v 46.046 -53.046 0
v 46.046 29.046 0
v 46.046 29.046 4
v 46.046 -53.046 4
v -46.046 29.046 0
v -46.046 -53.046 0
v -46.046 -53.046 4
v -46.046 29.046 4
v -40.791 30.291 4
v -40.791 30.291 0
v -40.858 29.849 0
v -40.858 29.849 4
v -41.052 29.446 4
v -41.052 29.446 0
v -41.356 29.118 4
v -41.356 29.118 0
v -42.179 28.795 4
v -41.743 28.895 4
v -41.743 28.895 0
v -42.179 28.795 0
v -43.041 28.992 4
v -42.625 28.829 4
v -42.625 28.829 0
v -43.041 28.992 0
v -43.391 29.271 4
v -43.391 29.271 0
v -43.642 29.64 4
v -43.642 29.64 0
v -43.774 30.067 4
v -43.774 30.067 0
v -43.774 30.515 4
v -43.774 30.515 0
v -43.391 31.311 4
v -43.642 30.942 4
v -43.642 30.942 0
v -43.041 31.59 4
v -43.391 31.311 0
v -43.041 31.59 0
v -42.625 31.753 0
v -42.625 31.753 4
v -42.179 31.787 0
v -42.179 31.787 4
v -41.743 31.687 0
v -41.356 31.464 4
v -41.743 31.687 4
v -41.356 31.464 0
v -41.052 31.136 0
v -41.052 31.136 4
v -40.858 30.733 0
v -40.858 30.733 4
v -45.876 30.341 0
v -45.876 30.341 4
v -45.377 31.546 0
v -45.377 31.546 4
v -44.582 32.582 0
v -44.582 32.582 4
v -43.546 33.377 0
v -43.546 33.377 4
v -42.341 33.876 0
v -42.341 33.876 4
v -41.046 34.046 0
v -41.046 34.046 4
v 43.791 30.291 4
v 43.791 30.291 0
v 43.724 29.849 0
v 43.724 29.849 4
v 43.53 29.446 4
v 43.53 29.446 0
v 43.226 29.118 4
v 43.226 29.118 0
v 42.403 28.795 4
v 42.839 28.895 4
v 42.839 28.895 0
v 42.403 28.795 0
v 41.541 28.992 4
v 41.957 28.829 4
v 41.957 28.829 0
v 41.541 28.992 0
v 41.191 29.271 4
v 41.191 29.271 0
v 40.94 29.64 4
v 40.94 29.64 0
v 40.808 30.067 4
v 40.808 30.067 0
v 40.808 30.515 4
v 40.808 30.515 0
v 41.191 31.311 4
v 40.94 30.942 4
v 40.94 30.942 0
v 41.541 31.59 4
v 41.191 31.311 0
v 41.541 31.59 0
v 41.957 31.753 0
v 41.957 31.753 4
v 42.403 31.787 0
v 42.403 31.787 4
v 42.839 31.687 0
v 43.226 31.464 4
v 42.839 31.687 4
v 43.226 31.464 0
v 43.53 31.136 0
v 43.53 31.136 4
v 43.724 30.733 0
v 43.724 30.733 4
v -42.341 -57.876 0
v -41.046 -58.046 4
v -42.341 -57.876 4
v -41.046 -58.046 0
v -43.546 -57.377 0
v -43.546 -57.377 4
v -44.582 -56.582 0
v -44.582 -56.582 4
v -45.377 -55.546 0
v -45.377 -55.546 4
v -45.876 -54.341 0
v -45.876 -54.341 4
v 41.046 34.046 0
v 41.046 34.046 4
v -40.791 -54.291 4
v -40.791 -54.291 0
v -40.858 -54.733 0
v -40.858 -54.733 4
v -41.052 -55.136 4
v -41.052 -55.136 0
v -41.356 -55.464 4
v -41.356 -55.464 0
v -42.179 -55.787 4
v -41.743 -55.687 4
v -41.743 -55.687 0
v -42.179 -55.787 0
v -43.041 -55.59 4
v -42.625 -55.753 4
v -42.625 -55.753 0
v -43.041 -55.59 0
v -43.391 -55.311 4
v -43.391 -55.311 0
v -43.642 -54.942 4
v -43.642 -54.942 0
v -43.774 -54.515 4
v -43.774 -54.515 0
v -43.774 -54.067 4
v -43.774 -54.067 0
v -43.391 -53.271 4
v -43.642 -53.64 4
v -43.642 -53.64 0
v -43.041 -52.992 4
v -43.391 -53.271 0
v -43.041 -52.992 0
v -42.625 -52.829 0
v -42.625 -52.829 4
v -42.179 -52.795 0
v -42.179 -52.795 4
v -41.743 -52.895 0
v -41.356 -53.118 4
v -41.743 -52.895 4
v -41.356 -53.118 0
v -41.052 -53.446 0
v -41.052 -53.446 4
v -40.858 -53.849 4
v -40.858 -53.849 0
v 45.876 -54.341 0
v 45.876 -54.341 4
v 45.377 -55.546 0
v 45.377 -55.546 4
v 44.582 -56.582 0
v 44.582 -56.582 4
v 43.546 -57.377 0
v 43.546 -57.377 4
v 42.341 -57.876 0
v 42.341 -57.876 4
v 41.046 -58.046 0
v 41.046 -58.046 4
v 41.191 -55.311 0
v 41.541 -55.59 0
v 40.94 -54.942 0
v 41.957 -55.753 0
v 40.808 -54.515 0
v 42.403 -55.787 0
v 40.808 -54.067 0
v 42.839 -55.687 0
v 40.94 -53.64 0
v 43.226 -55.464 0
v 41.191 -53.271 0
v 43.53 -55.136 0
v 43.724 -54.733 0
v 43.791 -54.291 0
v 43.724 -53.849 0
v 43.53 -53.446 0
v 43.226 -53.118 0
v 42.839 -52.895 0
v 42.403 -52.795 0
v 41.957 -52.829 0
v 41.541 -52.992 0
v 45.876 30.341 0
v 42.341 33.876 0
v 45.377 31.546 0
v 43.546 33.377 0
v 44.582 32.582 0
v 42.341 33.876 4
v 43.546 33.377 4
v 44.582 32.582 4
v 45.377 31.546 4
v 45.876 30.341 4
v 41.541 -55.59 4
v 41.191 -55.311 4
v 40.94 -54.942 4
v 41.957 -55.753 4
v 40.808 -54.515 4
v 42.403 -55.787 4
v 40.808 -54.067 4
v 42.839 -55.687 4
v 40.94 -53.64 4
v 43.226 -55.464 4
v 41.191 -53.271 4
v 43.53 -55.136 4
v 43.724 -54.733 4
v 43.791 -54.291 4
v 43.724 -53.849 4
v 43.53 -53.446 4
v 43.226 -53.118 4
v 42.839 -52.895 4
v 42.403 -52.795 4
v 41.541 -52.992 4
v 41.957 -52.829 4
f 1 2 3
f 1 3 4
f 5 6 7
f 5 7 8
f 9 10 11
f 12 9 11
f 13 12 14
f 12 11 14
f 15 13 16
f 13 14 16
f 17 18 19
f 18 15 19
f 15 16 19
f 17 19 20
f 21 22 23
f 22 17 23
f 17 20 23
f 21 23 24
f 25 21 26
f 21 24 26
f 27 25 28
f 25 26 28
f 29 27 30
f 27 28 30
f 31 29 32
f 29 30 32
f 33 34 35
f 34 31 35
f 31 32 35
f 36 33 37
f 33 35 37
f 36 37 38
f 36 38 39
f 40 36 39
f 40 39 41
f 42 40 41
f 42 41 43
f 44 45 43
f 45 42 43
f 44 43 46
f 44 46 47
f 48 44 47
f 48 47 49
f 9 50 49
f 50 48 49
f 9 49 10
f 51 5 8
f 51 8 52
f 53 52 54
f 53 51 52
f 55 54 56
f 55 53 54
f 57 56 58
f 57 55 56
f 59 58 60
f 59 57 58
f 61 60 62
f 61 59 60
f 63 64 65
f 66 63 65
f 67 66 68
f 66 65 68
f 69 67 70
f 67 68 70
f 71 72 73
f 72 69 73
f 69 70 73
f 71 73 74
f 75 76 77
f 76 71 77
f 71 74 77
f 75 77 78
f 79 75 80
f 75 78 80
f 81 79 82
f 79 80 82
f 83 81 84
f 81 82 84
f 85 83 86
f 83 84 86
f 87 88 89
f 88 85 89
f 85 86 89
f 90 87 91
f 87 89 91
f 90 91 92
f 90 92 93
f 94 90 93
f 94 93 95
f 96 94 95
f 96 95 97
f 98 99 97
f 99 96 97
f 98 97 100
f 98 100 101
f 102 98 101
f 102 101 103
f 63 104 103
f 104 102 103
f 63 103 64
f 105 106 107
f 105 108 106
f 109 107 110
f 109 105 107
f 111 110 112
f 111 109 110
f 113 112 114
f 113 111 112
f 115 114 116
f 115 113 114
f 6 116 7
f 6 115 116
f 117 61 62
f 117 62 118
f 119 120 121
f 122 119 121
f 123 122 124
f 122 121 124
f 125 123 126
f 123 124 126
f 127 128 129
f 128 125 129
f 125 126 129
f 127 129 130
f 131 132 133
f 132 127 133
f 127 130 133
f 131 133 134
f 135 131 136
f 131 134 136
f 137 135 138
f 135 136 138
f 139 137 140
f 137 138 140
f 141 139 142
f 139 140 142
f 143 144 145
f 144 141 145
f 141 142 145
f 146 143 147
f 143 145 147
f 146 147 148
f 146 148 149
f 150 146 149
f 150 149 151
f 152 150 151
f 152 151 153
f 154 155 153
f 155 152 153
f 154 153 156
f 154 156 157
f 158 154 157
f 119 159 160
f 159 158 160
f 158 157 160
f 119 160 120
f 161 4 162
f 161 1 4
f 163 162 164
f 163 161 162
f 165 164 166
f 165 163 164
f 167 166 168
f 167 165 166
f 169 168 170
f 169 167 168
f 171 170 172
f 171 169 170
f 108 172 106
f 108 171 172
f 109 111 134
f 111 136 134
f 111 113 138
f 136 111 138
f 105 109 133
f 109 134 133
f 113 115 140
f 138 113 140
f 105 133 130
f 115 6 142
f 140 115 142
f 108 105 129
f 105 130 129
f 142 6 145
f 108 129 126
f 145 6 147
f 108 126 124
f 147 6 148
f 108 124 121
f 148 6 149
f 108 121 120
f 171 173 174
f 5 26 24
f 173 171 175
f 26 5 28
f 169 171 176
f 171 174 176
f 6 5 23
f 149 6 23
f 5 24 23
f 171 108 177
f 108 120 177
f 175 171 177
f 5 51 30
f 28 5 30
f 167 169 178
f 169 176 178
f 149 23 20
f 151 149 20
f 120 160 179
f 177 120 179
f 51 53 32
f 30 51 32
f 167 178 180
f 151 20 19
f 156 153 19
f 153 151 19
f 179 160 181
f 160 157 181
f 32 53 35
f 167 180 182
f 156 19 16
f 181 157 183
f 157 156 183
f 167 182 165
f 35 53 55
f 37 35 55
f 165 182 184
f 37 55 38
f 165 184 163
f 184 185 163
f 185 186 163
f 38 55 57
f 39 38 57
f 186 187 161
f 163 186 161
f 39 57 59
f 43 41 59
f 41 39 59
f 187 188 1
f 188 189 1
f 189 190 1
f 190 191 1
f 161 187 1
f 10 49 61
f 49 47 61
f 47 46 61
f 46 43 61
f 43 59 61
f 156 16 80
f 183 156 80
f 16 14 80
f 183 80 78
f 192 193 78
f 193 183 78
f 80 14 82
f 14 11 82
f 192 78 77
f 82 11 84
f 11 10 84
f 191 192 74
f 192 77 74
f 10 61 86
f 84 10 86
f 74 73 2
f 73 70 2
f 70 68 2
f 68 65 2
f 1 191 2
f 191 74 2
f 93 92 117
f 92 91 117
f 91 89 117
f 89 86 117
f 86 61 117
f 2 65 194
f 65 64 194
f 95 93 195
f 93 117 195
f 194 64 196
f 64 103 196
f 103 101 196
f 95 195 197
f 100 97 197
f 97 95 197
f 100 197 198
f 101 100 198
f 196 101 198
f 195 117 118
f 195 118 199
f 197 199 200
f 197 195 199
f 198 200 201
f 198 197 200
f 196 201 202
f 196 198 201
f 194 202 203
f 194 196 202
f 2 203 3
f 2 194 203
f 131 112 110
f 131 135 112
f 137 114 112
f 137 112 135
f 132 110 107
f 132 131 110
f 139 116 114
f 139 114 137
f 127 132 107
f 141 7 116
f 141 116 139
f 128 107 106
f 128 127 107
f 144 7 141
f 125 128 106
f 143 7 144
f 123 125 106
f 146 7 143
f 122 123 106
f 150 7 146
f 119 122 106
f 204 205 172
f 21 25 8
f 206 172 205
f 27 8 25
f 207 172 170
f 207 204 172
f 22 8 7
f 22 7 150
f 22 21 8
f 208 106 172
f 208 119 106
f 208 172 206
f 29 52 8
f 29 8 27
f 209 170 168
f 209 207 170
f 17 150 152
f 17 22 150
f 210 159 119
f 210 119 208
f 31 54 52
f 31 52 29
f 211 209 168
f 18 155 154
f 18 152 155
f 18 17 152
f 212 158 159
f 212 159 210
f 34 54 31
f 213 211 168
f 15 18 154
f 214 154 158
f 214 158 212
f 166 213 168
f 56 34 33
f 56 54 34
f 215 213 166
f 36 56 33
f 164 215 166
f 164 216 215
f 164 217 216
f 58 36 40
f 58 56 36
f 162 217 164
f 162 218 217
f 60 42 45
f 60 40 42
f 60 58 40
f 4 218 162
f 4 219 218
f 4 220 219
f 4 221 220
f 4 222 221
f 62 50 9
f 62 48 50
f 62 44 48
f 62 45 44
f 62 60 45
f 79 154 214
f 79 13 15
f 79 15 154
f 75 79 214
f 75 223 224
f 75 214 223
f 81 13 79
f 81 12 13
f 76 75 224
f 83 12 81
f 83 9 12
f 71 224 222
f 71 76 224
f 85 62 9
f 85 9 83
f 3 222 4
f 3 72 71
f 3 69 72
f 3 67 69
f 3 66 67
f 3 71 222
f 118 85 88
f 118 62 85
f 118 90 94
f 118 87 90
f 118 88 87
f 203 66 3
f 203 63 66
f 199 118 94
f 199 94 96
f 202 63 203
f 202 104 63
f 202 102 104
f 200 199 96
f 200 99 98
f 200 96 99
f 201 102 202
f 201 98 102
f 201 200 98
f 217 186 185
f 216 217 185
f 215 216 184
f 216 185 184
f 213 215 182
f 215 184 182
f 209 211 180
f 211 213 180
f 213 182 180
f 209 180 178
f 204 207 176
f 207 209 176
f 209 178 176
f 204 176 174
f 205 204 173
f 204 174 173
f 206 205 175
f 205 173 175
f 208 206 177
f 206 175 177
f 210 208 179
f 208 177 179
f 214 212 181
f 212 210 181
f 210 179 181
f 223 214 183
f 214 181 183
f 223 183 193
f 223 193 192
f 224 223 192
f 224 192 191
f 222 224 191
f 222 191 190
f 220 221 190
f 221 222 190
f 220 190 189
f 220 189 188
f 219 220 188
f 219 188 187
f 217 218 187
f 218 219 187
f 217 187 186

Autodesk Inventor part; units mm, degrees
ref_plane "YZ Plane" through (0, 0, 0) normal (1, 0, 0) x (0, 1, 0)
ref_plane "XZ Plane" through (0, 0, 0) normal (0, 1, 0) x (-1, 0, 0)
ref_plane "XY Plane" through (0, 0, 0) normal (0, 0, 1) x (1, 0, 0)
sketch "Sketch1" plane through (0, 0, 0) normal (0, 0, 1) x (1, 0, 0)
  line L0 (-40, 28) -> (40, 28) construction
  line L1 (-40, -52) -> (-40, 28) construction
  line L2 (-40, 53) -> (-40, 133) construction
  line L3 (-40, 133) -> (40, 133) construction
  line L4 (40, 133) -> (40, 53) construction
  line L5 (40, 53) -> (-40, 53) construction
  line L6 (-40, -52) -> (-40, 28) construction
  line L7 (-40, 28) -> (40, 28) construction
  line L8 (40, 28) -> (40, -52) construction
  line L9 (40, -52) -> (-40, -52) construction
  circle A0 centre (-27.5, 195) radius 1.5 construction
  circle A1 centre (27.5, 195) radius 1.5 construction
  circle A2 centre (27.5, -116) radius 1.5 construction
  circle A3 centre (-27.5, -116) radius 1.5 construction
  circle A4 centre (-27.5, -183) radius 1.5 construction
  circle A5 centre (27.5, -183) radius 1.5 construction
  line L10 (-37.5, -118) -> (-72.5, -118) construction
  line L11 (-72.5, -118) -> (-72.5, -114) construction
  line L12 (-72.5, -114) -> (-37.5, -114) construction
  line L13 (-37.5, -114) -> (-37.5, -118) construction
  line L14 (72.5, 197) -> (72.5, 193) construction
  line L15 (72.5, 193) -> (37.5, 193) construction
  line L16 (37.5, 193) -> (37.5, 197) construction
  line L17 (37.5, 197) -> (72.5, 197) construction
  line L18 (-17.5, 197) -> (17.5, 197) construction
  line L19 (17.5, 197) -> (17.5, 193) construction
  line L20 (17.5, 193) -> (-17.5, 193) construction
  line L21 (-17.5, 193) -> (-17.5, 197) construction
  line L22 (-37.5, -185) -> (-72.5, -185) construction
  line L23 (-72.5, -185) -> (-72.5, -181) construction
  line L24 (-72.5, -181) -> (-37.5, -181) construction
  line L25 (-37.5, -181) -> (-37.5, -185) construction
  line L26 (17.5, -118) -> (-17.5, -118) construction
  line L27 (-17.5, -118) -> (-17.5, -114) construction
  line L28 (-17.5, -114) -> (17.5, -114) construction
  line L29 (17.5, -114) -> (17.5, -118) construction
  line L30 (72.5, -185) -> (37.5, -185) construction
  line L31 (37.5, -185) -> (37.5, -181) construction
  line L32 (37.5, -181) -> (72.5, -181) construction
  line L33 (72.5, -181) -> (72.5, -185) construction
  line L34 (-37.5, 193) -> (-72.5, 193) construction
  line L35 (-72.5, 193) -> (-72.5, 197) construction
  line L36 (-72.5, 197) -> (-37.5, 197) construction
  line L37 (-37.5, 197) -> (-37.5, 193) construction
  line L38 (17.5, -181) -> (17.5, -185) construction
  line L39 (17.5, -185) -> (-17.5, -185) construction
  line L40 (-17.5, -185) -> (-17.5, -181) construction
  line L41 (-17.5, -181) -> (17.5, -181) construction
  line L42 (72.5, -114) -> (72.5, -118) construction
  line L43 (72.5, -118) -> (37.5, -118) construction
  line L44 (37.5, -118) -> (37.5, -114) construction
  line L45 (37.5, -114) -> (72.5, -114) construction
  circle A6 centre (-102, 39.5) radius 1.5 construction
  circle A7 centre (-102, -110.5) radius 1.5 construction
  circle A8 centre (102, -35.5) radius 1.5 construction
  circle A9 centre (102, 114.5) radius 1.5 construction
  circle A10 centre (102, -185.5) radius 1.5 construction
  circle A11 centre (-102, 189.5) radius 1.5 construction
  line L46 (100, 188) -> (95.2, 188) construction
  line L47 (95.2, 188) -> (95.2, 186.8) construction
  line L48 (95.2, 186.8) -> (92.8, 186.8) construction
  line L49 (92.8, 186.8) -> (92.8, 188) construction
  line L50 (92.8, 188) -> (88, 188) construction
  line L51 (88, 188) -> (88, 191) construction
  line L52 (88, 191) -> (92.8, 191) construction
  line L53 (92.8, 191) -> (92.8, 192.2) construction
  line L54 (92.8, 192.2) -> (95.2, 192.2) construction
  line L55 (95.2, 192.2) -> (95.2, 191) construction
  line L56 (95.2, 191) -> (100, 191) construction
  line L57 (100, 227) -> (100, 191) construction
  line L58 (87.5, 227) -> (100, 227) construction
  line L59 (87.5, 231) -> (87.5, 227) construction
  line L60 (52.5, 231) -> (87.5, 231) construction
  line L61 (52.5, 227) -> (52.5, 231) construction
  line L62 (36.5, 227) -> (52.5, 227) construction
  line L63 (36.5, 222.2) -> (36.5, 227) construction
  line L64 (37.7, 222.2) -> (36.5, 222.2) construction
  line L65 (37.7, 219.8) -> (37.7, 222.2) construction
  line L66 (36.5, 219.8) -> (37.7, 219.8) construction
  line L67 (36.5, 215) -> (36.5, 219.8) construction
  line L68 (33.5, 215) -> (36.5, 215) construction
  line L69 (33.5, 219.8) -> (33.5, 215) construction
  line L70 (32.3, 219.8) -> (33.5, 219.8) construction
  line L71 (32.3, 222.2) -> (32.3, 219.8) construction
  line L72 (33.5, 222.2) -> (32.3, 222.2) construction
  line L73 (33.5, 227) -> (33.5, 222.2) construction
  line L74 (17.5, 227) -> (33.5, 227) construction
  line L75 (17.5, 231) -> (17.5, 227) construction
  line L76 (-17.5, 231) -> (17.5, 231) construction
  line L77 (-17.5, 227) -> (-17.5, 231) construction
  line L78 (-33.5, 227) -> (-17.5, 227) construction
  line L79 (-33.5, 222.2) -> (-33.5, 227) construction
  line L80 (-32.3, 222.2) -> (-33.5, 222.2) construction
  line L81 (-32.3, 219.8) -> (-32.3, 222.2) construction
  line L82 (-33.5, 219.8) -> (-32.3, 219.8) construction
  line L83 (-33.5, 215) -> (-33.5, 219.8) construction
  line L84 (-36.5, 215) -> (-33.5, 215) construction
  line L85 (-36.5, 219.8) -> (-36.5, 215) construction
  line L86 (-37.7, 219.8) -> (-36.5, 219.8) construction
  line L87 (-37.7, 222.2) -> (-37.7, 219.8) construction
  line L88 (-36.5, 222.2) -> (-37.7, 222.2) construction
  line L89 (-36.5, 227) -> (-36.5, 222.2) construction
  line L90 (-52.5, 227) -> (-36.5, 227) construction
  line L91 (-52.5, 231) -> (-52.5, 227) construction
  line L92 (-87.5, 231) -> (-52.5, 231) construction
  line L93 (-87.5, 227) -> (-87.5, 231) construction
  line L94 (-104, 227) -> (-87.5, 227) construction
  line L95 (-104, 152) -> (-104, 227) construction
  line L96 (-100, 152) -> (-104, 152) construction
  line L97 (-100, 116) -> (-100, 152) construction
  line L98 (-100, 116) -> (-95.2, 116) construction
  line L99 (-95.2, 116) -> (-95.2, 117.2) construction
  line L100 (-95.2, 117.2) -> (-92.8, 117.2) construction
  line L101 (-92.8, 117.2) -> (-92.8, 116) construction
  line L102 (-92.8, 116) -> (-88, 116) construction
  line L103 (-88, 116) -> (-88, 113) construction
  line L104 (-88, 113) -> (-92.8, 113) construction
  line L105 (-92.8, 113) -> (-92.8, 111.8) construction
  line L106 (-92.8, 111.8) -> (-95.2, 111.8) construction
  line L107 (-95.2, 111.8) -> (-95.2, 113) construction
  line L108 (-95.2, 113) -> (-100, 113) construction
  line L109 (-100, 77) -> (-100, 113) construction
  line L110 (-104, 77) -> (-100, 77) construction
  line L111 (-104, 2) -> (-104, 77) construction
  line L112 (-100, 2) -> (-104, 2) construction
  line L113 (-100, -34) -> (-100, 2) construction
  line L114 (-100, -34) -> (-95.2, -34) construction
  line L115 (-95.2, -34) -> (-95.2, -32.8) construction
  line L116 (-95.2, -32.8) -> (-92.8, -32.8) construction
  line L117 (-92.8, -32.8) -> (-92.8, -34) construction
  line L118 (-92.8, -34) -> (-88, -34) construction
  line L119 (-88, -34) -> (-88, -37) construction
  line L120 (-88, -37) -> (-92.8, -37) construction
  line L121 (-92.8, -37) -> (-92.8, -38.2) construction
  line L122 (-92.8, -38.2) -> (-95.2, -38.2) construction
  line L123 (-95.2, -38.2) -> (-95.2, -37) construction
  line L124 (-95.2, -37) -> (-100, -37) construction
  line L125 (-100, -73) -> (-100, -37) construction
  line L126 (-104, -73) -> (-100, -73) construction
  line L127 (-104, -148) -> (-104, -73) construction
  line L128 (-100, -148) -> (-104, -148) construction
  line L129 (-100, -184) -> (-100, -148) construction
  line L130 (-100, -184) -> (-95.2, -184) construction
  line L131 (-95.2, -184) -> (-95.2, -182.8) construction
  line L132 (-95.2, -182.8) -> (-92.8, -182.8) construction
  line L133 (-92.8, -182.8) -> (-92.8, -184) construction
  line L134 (-92.8, -184) -> (-88, -184) construction
  line L135 (-88, -184) -> (-88, -187) construction
  line L136 (-88, -187) -> (-92.8, -187) construction
  line L137 (-92.8, -187) -> (-92.8, -188.2) construction
  line L138 (-92.8, -188.2) -> (-95.2, -188.2) construction
  line L139 (-95.2, -188.2) -> (-95.2, -187) construction
  line L140 (-95.2, -187) -> (-100, -187) construction
  line L141 (-100, -223) -> (-100, -187) construction
  line L142 (-87.5, -223) -> (-100, -223) construction
  line L143 (-87.5, -231) -> (-87.5, -223) construction
  line L144 (-52.5, -231) -> (-87.5, -231) construction
  line L145 (-52.5, -223) -> (-52.5, -231) construction
  line L146 (-36.5, -223) -> (-52.5, -223) construction
  line L147 (-36.5, -218.2) -> (-36.5, -223) construction
  line L148 (-37.7, -218.2) -> (-36.5, -218.2) construction
  line L149 (-37.7, -215.8) -> (-37.7, -218.2) construction
  line L150 (-36.5, -215.8) -> (-37.7, -215.8) construction
  line L151 (-36.5, -211) -> (-36.5, -215.8) construction
  line L152 (-33.5, -211) -> (-36.5, -211) construction
  line L153 (-33.5, -215.8) -> (-33.5, -211) construction
  line L154 (-32.3, -215.8) -> (-33.5, -215.8) construction
  line L155 (-32.3, -218.2) -> (-32.3, -215.8) construction
  line L156 (-33.5, -218.2) -> (-32.3, -218.2) construction
  line L157 (-33.5, -223) -> (-33.5, -218.2) construction
  line L158 (-17.5, -223) -> (-33.5, -223) construction
  line L159 (-17.5, -231) -> (-17.5, -223) construction
  line L160 (17.5, -231) -> (-17.5, -231) construction
  line L161 (17.5, -223) -> (17.5, -231) construction
  line L162 (33.5, -223) -> (17.5, -223) construction
  line L163 (33.5, -218.2) -> (33.5, -223) construction
  line L164 (32.3, -218.2) -> (33.5, -218.2) construction
  line L165 (32.3, -215.8) -> (32.3, -218.2) construction
  line L166 (33.5, -215.8) -> (32.3, -215.8) construction
  line L167 (33.5, -211) -> (33.5, -215.8) construction
  line L168 (36.5, -211) -> (33.5, -211) construction
  line L169 (36.5, -215.8) -> (36.5, -211) construction
  line L170 (37.7, -215.8) -> (36.5, -215.8) construction
  line L171 (37.7, -218.2) -> (37.7, -215.8) construction
  line L172 (36.5, -218.2) -> (37.7, -218.2) construction
  line L173 (36.5, -223) -> (36.5, -218.2) construction
  line L174 (52.5, -223) -> (36.5, -223) construction
  line L175 (52.5, -231) -> (52.5, -223) construction
  line L176 (87.5, -231) -> (52.5, -231) construction
  line L177 (87.5, -223) -> (87.5, -231) construction
  line L178 (104, -223) -> (87.5, -223) construction
  line L179 (104, -148) -> (104, -223) construction
  line L180 (100, -148) -> (104, -148) construction
  line L181 (100, -112) -> (100, -148) construction
  line L182 (100, -112) -> (95.2, -112) construction
  line L183 (95.2, -112) -> (95.2, -113.2) construction
  line L184 (95.2, -113.2) -> (92.8, -113.2) construction
  line L185 (92.8, -113.2) -> (92.8, -112) construction
  line L186 (92.8, -112) -> (88, -112) construction
  line L187 (88, -112) -> (88, -109) construction
  line L188 (88, -109) -> (92.8, -109) construction
  line L189 (92.8, -109) -> (92.8, -107.8) construction
  line L190 (92.8, -107.8) -> (95.2, -107.8) construction
  line L191 (95.2, -107.8) -> (95.2, -109) construction
  line L192 (95.2, -109) -> (100, -109) construction
  line L193 (100, -73) -> (100, -109) construction
  line L194 (104, -73) -> (100, -73) construction
  line L195 (104, 2) -> (104, -73) construction
  line L196 (100, 2) -> (104, 2) construction
  line L197 (100, 38) -> (100, 2) construction
  line L198 (100, 38) -> (95.2, 38) construction
  line L199 (95.2, 38) -> (95.2, 36.8) construction
  line L200 (95.2, 36.8) -> (92.8, 36.8) construction
  line L201 (92.8, 36.8) -> (92.8, 38) construction
  line L202 (92.8, 38) -> (88, 38) construction
  line L203 (88, 38) -> (88, 41) construction
  line L204 (88, 41) -> (92.8, 41) construction
  line L205 (92.8, 41) -> (92.8, 42.2) construction
  line L206 (92.8, 42.2) -> (95.2, 42.2) construction
  line L207 (95.2, 42.2) -> (95.2, 41) construction
  line L208 (95.2, 41) -> (100, 41) construction
  line L209 (100, 77) -> (100, 41) construction
  line L210 (104, 77) -> (100, 77) construction
  line L211 (104, 152) -> (104, 77) construction
  line L212 (100, 152) -> (104, 152) construction
  line L213 (100, 188) -> (100, 152) construction
  line L214 (-40, 28) -> (40, 28) construction
  line L215 (40, 28) -> (40, -52) construction
  line L216 (40, -52) -> (-40, -52) construction
  line L217 (-40, -52) -> (-40, 28) construction
  line L218 (-41.0465, 34.0465) -> (41.0465, 34.0465)
  line L219 (46.0465, 29.0465) -> (46.0465, -53.0465)
  line L220 (41.0465, -58.0465) -> (-41.0465, -58.0465)
  line L221 (-46.0465, -53.0465) -> (-46.0465, 29.0465)
  circle A12 centre (-42.291, 30.291) radius 1.5
  line L222 (-40, 28) -> (40, -52) construction
  line L223 (-40, 28) -> (-46.0465, 34.0465) construction
  arc A13 (-41.0465, 34.0465) -> (-46.0465, 29.0465) centre (-41.0465, 29.0465) ccw
  arc A14 (46.0465, 29.0465) -> (41.0465, 34.0465) centre (41.0465, 29.0465) ccw
  arc A15 (41.0465, -58.0465) -> (46.0465, -53.0465) centre (41.0465, -53.0465) ccw
  arc A16 (-46.0465, -53.0465) -> (-41.0465, -58.0465) centre (-41.0465, -53.0465) ccw
  circle A17 centre (-42.291, -54.291) radius 1.5
  circle A18 centre (42.291, -54.291) radius 1.5
  circle A19 centre (42.291, 30.291) radius 1.5
  circle A20 centre (42.291, 50.709) radius 1.5 projected
  circle A21 centre (-42.291, -54.291) radius 1.5 projected
  circle A22 centre (42.291, 30.291) radius 1.5 projected
  circle A23 centre (42.291, 135.291) radius 1.5 projected
  circle A24 centre (-42.291, 50.709) radius 1.5 projected
  circle A25 centre (42.291, -54.291) radius 1.5 projected
  circle A26 centre (-42.291, 30.291) radius 1.5 projected
  circle A27 centre (-42.291, 135.291) radius 1.5 projected
  point P0 (0, 0)
  point P1 (0, -12)
  point P2 (-44.5821, 32.5821)
  dimension "d1" = 3
  dimension "d2" = 3.24
  dimension "d3" = 5
  dimension "d4" = 3.24
  dimension "d7" = 360
extrude "Extrusion1" add sketch "Sketch1" along normal blind 4 contours L218 A14 L219 A15 L220 A16 L221 A13
properties part number "Protector_80x80" material "Glass"
